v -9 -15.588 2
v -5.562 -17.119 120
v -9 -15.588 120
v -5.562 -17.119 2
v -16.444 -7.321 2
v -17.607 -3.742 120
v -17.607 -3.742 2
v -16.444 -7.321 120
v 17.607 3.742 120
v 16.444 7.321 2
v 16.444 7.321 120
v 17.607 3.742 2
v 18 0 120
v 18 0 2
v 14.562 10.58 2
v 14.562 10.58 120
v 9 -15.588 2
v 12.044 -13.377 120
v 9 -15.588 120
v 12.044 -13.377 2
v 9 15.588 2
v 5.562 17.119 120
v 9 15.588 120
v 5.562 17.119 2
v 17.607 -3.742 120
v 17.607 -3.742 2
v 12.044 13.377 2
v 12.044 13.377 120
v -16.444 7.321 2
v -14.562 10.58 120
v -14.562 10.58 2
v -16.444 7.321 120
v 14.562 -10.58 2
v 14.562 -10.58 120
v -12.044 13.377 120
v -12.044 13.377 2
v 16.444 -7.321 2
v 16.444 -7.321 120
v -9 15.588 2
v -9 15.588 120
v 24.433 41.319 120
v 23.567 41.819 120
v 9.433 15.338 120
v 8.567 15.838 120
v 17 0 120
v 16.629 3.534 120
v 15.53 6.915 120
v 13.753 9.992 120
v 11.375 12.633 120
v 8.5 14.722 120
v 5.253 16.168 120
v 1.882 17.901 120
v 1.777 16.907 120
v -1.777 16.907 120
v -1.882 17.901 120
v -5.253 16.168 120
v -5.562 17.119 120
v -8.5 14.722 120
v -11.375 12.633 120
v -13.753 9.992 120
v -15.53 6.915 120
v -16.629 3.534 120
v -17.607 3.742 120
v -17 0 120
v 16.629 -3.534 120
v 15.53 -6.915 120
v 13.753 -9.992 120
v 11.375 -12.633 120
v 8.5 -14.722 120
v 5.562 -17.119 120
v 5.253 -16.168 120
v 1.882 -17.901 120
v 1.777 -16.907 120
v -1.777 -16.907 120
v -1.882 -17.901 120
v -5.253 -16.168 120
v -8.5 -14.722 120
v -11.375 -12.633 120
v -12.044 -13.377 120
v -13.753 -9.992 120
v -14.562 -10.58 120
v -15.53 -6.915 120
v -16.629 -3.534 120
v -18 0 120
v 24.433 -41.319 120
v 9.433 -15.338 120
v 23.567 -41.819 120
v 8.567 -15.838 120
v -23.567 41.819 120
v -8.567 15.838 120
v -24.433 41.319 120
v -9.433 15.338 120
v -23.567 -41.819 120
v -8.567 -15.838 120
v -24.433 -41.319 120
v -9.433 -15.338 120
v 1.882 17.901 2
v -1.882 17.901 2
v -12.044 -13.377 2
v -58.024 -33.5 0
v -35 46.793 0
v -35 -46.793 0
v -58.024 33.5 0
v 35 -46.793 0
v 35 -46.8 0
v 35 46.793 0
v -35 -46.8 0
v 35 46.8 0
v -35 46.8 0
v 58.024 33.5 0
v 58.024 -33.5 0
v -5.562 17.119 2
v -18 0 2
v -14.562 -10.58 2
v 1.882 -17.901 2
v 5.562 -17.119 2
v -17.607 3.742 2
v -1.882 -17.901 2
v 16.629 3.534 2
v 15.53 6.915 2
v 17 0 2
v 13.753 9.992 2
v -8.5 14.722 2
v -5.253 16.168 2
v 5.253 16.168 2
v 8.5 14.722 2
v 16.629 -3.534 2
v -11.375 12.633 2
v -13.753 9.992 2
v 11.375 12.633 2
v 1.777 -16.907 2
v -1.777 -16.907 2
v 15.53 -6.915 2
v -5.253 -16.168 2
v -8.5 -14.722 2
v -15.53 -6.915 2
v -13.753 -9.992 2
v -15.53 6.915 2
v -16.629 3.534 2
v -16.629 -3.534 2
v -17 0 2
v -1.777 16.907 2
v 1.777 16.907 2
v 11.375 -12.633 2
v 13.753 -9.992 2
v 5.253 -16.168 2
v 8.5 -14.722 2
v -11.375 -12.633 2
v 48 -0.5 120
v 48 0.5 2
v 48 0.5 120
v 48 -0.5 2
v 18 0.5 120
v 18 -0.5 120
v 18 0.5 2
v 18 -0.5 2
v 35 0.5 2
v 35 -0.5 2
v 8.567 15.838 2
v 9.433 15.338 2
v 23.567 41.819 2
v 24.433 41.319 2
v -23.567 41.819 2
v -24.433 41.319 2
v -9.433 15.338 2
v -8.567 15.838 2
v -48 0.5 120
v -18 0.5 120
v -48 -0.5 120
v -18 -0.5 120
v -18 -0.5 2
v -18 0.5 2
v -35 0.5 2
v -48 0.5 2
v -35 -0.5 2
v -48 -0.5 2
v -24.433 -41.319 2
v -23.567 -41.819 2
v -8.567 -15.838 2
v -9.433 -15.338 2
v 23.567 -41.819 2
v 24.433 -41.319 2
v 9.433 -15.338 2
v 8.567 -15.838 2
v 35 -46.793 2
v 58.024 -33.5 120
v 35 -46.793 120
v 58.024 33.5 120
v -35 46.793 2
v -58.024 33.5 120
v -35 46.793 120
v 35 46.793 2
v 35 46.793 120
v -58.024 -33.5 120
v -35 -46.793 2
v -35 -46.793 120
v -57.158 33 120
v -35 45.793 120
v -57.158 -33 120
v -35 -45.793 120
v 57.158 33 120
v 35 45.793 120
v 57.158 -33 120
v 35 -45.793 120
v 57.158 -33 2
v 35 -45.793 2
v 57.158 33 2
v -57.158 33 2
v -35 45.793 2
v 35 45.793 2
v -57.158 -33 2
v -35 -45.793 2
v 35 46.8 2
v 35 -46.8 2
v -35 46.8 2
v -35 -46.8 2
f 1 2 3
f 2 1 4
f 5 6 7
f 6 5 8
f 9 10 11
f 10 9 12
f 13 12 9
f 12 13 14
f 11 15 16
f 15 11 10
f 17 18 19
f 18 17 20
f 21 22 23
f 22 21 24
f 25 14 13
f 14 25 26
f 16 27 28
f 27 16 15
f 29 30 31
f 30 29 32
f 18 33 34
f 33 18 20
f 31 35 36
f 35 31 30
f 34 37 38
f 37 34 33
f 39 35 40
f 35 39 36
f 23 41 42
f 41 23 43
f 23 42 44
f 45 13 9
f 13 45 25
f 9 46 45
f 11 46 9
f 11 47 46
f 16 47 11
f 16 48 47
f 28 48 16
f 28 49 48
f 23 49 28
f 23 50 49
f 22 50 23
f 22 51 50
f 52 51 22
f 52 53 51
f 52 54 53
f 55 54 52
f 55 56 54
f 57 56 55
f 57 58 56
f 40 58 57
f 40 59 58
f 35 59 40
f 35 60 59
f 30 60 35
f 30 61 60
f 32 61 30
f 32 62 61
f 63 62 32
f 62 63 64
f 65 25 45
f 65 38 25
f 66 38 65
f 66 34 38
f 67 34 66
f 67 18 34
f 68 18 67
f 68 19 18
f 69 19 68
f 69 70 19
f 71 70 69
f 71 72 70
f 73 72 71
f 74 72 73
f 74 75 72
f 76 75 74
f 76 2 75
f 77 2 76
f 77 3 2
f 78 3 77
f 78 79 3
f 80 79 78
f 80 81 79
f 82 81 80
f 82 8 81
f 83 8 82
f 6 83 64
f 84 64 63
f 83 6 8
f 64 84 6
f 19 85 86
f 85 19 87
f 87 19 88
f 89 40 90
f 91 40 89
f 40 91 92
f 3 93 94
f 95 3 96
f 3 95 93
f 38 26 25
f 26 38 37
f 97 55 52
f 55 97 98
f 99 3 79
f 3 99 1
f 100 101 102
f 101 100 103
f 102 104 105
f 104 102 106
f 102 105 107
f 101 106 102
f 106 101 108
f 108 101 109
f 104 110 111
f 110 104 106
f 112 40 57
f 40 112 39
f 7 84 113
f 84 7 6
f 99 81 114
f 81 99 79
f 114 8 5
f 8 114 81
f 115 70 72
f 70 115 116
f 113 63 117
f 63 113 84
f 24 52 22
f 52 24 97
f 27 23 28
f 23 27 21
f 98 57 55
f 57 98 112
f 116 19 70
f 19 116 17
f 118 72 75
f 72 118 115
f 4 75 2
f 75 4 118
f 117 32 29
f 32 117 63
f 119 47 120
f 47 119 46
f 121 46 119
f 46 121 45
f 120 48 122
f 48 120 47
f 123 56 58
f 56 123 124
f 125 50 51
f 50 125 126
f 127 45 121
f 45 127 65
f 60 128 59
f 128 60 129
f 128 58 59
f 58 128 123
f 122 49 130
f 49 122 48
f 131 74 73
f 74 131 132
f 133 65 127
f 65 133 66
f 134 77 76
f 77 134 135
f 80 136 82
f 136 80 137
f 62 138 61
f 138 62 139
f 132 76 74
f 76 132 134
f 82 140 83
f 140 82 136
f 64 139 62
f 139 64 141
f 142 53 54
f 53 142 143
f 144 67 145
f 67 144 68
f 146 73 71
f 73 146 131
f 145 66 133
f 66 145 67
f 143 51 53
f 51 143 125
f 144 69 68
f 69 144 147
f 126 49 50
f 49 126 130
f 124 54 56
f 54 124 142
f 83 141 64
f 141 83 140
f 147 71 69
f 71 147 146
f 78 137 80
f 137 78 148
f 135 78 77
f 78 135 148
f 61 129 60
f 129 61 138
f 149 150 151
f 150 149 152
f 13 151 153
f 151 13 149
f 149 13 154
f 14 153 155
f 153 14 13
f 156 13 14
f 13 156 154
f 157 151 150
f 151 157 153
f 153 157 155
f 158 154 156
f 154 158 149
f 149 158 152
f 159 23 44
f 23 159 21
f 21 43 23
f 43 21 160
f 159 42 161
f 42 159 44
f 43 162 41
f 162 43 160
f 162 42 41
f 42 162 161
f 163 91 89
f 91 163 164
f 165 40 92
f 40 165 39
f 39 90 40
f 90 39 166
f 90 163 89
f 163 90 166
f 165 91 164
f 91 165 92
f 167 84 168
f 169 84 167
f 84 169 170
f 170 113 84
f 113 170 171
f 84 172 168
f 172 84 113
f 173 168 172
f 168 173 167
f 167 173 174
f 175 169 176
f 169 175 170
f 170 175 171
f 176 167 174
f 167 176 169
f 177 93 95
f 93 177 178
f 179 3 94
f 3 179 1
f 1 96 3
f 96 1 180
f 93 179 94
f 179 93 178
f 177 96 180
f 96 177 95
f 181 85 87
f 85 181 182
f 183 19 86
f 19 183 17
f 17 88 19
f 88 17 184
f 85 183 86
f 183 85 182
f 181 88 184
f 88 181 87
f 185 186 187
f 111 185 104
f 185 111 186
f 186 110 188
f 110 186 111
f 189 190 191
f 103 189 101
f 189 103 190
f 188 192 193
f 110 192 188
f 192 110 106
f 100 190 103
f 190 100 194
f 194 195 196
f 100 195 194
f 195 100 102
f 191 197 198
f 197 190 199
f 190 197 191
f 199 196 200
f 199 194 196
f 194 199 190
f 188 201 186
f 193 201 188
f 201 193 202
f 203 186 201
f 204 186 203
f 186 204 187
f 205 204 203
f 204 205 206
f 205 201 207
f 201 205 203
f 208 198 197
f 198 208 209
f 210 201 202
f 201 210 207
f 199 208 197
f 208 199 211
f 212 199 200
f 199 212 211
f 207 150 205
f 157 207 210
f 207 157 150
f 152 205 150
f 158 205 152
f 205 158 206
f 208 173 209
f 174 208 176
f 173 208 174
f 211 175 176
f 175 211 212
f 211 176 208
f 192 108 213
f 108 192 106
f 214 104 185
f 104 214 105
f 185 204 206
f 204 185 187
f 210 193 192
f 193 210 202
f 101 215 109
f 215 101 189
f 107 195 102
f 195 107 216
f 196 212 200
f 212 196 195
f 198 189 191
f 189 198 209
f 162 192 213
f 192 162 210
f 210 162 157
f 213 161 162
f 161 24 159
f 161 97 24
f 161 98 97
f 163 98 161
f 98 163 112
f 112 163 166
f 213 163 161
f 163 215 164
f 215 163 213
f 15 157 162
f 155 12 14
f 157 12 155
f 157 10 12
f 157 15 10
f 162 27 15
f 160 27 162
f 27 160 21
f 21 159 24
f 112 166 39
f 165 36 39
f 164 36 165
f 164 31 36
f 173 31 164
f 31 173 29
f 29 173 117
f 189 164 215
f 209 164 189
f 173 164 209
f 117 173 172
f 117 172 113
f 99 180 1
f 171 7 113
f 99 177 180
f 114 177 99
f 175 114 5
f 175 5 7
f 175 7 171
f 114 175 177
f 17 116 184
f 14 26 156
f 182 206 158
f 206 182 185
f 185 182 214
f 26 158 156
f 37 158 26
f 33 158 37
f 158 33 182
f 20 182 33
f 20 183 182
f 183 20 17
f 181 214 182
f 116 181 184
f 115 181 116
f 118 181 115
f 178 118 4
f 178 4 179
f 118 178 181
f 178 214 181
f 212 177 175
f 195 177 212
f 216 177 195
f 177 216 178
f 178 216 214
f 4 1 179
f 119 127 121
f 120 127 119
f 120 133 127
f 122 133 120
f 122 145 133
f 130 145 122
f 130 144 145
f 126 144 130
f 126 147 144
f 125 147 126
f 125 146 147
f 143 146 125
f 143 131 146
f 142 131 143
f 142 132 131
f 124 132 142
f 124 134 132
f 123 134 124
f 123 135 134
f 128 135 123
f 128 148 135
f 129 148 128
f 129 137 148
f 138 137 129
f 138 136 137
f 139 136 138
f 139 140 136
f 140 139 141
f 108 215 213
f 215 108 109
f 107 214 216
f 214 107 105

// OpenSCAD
scale([2,2,2])
{
$fn=30;

difference(){
    cylinder(d=18,h=60);
    translate([0,0,-1])cylinder(d=17,h=62);
}

for (j=[0:60:300]){
    rotate([0,0,j])
    translate([9,-.25,0])
    cube([15,.5,60]);
}

difference(){
    rotate([0,0,30])
    cylinder(d=67,h=60,$fn=6);
    rotate([0,0,30])translate([0,0,1])
    cylinder(d=66,h=65,$fn=6);
    translate([0,0,25])cube([35,70,72],center=true);
}

translate([0,0,0.5])
cube([35,46.8,1],center=true);
}
